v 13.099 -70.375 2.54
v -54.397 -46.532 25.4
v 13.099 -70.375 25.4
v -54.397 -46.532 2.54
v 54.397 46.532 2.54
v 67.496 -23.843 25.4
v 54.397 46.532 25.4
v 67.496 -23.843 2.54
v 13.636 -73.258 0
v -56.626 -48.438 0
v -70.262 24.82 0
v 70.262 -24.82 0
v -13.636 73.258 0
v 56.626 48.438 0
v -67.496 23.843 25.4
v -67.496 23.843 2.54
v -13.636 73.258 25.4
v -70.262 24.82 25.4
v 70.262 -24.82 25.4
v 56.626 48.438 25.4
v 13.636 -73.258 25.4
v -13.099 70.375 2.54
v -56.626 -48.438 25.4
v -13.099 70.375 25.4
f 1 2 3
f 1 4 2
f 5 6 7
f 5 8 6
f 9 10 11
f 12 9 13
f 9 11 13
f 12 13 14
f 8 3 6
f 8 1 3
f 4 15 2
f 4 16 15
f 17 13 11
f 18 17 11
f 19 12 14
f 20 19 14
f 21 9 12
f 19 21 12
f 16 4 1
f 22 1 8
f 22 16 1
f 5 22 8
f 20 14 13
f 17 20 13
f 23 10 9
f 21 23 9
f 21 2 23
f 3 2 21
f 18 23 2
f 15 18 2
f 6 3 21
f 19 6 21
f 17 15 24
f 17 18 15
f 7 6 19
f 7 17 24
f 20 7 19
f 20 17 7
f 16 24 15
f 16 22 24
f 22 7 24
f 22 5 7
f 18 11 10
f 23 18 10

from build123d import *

# Parameters (mm, degrees)
F2_DEPTH = 25.4
F3_T     = -2.54


with BuildPart() as f2:
    # F1 (on face) → F2 (new body)
    with BuildSketch(Plane.XY):
        Polygon((-13.636127, 73.258446), (-70.261739, 24.819991), (-56.625612, -48.438456), (13.636127, -73.258446), (70.261739, -24.819991), (56.625612, 48.438456), align=None)
    extrude(amount=F2_DEPTH)

    # F3
    f3_openings = [f2.faces().sort_by_distance(p)[0] for p in [
        (0, 0, 25.4),
    ]]
    offset(amount=F3_T, openings=f3_openings)


solid = f2.part
